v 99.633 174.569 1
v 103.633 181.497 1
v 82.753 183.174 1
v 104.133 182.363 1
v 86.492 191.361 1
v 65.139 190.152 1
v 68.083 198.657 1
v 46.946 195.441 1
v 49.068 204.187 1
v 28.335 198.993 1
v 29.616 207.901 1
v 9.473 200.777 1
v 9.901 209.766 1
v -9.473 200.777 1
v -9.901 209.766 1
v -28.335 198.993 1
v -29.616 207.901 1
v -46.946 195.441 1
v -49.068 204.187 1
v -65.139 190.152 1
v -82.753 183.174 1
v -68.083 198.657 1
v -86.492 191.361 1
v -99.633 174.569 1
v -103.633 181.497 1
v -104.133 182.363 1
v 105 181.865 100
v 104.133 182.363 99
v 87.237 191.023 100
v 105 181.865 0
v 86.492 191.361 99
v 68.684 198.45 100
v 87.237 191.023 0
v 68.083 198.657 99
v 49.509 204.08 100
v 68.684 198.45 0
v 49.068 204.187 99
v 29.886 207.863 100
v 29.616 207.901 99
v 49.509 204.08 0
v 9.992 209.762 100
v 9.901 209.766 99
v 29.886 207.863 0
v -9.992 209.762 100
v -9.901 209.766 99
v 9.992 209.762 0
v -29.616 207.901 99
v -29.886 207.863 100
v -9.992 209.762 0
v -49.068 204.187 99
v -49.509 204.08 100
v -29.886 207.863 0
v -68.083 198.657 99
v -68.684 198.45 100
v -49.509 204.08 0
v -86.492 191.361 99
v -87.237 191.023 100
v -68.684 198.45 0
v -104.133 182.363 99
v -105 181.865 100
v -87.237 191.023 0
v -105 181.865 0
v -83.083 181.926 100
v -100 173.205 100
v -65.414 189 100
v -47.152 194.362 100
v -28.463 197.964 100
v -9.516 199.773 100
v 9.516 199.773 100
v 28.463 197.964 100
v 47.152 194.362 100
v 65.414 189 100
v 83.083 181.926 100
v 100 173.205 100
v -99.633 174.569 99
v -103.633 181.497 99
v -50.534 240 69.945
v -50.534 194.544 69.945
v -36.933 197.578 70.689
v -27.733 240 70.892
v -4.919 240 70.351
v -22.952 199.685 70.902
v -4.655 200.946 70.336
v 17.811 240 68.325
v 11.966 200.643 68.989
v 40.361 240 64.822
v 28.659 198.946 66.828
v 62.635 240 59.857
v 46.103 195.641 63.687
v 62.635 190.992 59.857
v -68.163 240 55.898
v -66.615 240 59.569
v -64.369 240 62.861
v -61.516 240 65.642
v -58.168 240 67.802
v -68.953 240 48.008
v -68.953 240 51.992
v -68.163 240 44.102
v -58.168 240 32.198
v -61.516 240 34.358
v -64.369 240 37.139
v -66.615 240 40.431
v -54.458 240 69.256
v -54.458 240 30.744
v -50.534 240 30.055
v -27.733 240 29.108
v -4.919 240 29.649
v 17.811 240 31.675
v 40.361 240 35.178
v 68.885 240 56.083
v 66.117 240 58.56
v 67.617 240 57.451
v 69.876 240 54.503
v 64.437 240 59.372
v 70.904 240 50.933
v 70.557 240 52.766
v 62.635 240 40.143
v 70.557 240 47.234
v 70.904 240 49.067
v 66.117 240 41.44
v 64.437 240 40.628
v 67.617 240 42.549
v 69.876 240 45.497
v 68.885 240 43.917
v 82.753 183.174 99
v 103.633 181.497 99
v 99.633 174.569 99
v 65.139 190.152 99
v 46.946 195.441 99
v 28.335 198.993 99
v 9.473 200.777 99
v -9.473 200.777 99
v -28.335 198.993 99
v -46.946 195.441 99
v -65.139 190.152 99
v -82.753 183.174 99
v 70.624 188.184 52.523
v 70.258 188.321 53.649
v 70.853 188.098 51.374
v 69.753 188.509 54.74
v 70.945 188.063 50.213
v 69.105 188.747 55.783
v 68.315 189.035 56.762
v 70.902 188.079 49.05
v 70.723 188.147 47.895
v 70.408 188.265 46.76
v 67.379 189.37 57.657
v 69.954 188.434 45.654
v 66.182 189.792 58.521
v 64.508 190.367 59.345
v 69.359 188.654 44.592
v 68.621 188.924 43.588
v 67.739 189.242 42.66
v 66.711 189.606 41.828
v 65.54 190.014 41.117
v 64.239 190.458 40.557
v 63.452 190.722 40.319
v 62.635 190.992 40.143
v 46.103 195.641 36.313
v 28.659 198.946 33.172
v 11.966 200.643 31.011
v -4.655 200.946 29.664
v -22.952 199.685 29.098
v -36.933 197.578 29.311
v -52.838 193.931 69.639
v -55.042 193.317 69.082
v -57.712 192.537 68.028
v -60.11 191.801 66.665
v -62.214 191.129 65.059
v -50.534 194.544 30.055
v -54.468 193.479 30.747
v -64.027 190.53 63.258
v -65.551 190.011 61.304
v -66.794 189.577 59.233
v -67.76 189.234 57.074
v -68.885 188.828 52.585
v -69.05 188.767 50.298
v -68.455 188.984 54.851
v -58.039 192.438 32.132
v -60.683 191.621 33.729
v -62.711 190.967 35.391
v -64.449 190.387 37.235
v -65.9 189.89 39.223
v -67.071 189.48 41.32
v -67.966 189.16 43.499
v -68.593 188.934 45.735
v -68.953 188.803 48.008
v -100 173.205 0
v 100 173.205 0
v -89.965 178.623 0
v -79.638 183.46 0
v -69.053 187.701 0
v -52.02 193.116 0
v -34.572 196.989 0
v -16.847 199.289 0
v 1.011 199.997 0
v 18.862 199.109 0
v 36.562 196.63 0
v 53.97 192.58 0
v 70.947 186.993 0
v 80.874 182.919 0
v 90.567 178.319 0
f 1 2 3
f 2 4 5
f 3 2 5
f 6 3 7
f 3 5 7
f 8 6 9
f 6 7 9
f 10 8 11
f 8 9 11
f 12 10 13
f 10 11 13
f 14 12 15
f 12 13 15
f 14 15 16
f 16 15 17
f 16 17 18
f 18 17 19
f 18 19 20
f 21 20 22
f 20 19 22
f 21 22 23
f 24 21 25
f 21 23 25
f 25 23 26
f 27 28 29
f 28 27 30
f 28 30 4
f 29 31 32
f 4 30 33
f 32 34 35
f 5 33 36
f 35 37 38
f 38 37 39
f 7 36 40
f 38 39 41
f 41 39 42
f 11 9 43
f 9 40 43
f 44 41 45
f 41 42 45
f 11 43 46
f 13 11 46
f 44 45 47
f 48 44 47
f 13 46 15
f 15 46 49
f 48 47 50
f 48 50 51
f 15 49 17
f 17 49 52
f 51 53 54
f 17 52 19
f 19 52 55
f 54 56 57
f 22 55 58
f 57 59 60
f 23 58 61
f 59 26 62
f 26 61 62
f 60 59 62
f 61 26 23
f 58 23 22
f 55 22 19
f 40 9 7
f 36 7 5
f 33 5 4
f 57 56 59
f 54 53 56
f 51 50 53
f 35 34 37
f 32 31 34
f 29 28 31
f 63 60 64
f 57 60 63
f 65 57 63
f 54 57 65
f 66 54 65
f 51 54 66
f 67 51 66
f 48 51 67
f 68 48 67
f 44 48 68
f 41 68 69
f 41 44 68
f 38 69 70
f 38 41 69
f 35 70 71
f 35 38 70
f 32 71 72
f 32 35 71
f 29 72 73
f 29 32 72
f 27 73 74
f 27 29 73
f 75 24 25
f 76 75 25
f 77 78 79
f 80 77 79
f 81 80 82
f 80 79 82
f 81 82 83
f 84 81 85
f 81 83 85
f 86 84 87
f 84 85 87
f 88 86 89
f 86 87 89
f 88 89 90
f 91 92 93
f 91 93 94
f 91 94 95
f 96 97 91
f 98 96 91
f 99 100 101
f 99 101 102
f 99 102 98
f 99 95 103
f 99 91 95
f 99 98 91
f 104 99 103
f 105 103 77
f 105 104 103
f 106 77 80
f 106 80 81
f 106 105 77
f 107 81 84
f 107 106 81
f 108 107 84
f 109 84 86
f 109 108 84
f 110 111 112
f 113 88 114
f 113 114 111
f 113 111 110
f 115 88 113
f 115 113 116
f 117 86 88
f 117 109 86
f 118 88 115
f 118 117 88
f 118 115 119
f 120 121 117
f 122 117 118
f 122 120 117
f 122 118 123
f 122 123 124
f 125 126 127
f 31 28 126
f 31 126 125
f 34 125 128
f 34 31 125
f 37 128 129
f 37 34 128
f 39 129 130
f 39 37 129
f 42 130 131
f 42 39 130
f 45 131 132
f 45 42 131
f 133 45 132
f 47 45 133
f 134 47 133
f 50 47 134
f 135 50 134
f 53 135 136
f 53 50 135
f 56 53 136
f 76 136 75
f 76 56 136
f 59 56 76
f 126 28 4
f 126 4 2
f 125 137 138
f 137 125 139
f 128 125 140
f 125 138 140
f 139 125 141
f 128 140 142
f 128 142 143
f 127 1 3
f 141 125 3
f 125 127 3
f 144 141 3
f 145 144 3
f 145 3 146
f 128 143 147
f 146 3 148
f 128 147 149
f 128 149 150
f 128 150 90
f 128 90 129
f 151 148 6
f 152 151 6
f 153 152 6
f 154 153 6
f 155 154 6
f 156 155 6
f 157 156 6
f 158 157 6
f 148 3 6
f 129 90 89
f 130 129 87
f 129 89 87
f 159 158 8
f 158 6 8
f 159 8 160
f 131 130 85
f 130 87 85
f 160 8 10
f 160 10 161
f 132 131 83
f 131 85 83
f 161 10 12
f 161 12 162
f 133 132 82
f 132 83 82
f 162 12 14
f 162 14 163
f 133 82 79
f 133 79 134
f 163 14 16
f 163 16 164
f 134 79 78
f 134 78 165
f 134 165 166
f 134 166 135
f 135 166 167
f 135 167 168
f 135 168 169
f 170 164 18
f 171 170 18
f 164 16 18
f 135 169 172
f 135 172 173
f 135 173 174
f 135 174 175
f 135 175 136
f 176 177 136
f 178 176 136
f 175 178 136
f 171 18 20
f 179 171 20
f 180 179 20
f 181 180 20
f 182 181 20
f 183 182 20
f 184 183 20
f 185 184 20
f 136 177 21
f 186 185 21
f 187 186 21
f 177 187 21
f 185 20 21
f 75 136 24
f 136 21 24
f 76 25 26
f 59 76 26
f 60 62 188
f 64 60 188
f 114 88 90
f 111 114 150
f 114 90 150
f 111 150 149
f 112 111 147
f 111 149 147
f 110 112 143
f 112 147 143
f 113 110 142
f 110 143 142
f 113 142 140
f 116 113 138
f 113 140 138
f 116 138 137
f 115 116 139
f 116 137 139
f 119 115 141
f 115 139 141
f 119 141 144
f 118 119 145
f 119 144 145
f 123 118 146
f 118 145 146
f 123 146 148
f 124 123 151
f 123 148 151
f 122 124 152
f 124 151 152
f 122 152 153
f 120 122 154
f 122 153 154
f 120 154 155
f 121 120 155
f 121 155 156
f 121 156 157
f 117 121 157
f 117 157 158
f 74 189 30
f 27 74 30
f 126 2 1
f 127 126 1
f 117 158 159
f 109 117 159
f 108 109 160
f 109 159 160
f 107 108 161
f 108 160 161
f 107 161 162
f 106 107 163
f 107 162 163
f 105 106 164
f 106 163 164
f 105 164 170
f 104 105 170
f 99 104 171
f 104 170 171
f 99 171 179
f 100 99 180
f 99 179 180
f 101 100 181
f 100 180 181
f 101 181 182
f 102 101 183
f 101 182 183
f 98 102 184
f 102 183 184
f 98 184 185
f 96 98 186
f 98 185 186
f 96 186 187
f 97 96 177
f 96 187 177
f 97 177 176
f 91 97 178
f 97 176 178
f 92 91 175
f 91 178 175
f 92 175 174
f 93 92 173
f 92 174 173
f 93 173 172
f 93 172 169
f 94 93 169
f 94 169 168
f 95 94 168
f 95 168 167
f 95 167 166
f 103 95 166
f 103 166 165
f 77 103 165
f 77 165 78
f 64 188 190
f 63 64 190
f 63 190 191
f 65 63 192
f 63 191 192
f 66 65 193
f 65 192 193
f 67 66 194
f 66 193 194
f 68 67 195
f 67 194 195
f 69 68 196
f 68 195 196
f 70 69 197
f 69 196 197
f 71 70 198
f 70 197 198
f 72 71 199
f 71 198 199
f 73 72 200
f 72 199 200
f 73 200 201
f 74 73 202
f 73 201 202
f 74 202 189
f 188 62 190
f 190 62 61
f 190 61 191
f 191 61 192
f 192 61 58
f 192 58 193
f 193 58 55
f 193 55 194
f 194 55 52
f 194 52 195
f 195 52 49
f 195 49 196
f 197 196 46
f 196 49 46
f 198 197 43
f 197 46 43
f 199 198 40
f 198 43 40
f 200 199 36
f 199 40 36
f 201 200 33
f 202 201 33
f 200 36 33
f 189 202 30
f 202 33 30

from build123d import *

# Parameters (mm, degrees)
BOSS_EXTRUDE1_DEPTH = 100
CUT_EXTRUDE1_DEPTH  = 98
BOSS_EXTRUDE2_DEPTH = 240
CUT_EXTRUDE2_DEPTH  = 305


with BuildPart() as part:
    # Sketch1 → Boss-Extrude1 (new body)
    with BuildSketch(Plane.XY):
        with BuildLine():
            Line((-105, 181.865334795), (-100, 173.205080757))
            ThreePointArc((-100, 173.205080757), (0, 200), (100, 173.205080757))
            Line((100, 173.205080757), (105, 181.865334795))
            ThreePointArc((105, 181.865334795), (0, 210), (-105, 181.865334795))
        make_face()
    extrude(amount=BOSS_EXTRUDE1_DEPTH)

    # Sketch2 → Cut-Extrude1 (cut)
    with BuildSketch(Plane(origin=(0, 0, 1), x_dir=(-1, 0, 0), z_dir=(0, 0, -1))):
        with BuildLine():
            Line((99.632730807, 174.568951855), (103.632778417, 181.497237548))
            ThreePointArc((103.632778417, 181.497237548), (0, 209), (-103.632778417, 181.497237548))
            Line((-103.632778417, 181.497237548), (-99.632730807, 174.568951855))
            ThreePointArc((-99.632730807, 174.568951855), (0, 201), (99.632730807, 174.568951855))
        make_face()
        with BuildLine():
            Line((-104.132784113, 182.363272818), (-103.632778417, 181.497237548))
            ThreePointArc((-103.632778417, 181.497237548), (0, 209), (103.632778417, 181.497237548))
            Line((103.632778417, 181.497237548), (104.132784113, 182.363272818))
            ThreePointArc((104.132784113, 182.363272818), (0, 210), (-104.132784113, 182.363272818))
        make_face()
        with BuildLine():
            Line((-105.359240795, 184.487558104), (-104.132784113, 182.363272818))
            ThreePointArc((-104.132784113, 182.363272818), (0, 210), (104.132784113, 182.363272818))
            Line((104.132784113, 182.363272818), (105.359240795, 184.487558104))
            ThreePointArc((105.359240795, 184.487558104), (0, 213.475505009), (-105.359240795, 184.487558104))
        make_face()
    extrude(amount=-CUT_EXTRUDE1_DEPTH, mode=Mode.SUBTRACT)

    # Sketch3 → Boss-Extrude2 (add)
    with BuildSketch(Plane(origin=(0, 0, 0), x_dir=(1, 0, 0), z_dir=(0, 1, 0))):
        with BuildLine():
            ThreePointArc((-50.533623167, -30.054914333), (-69.052556755, -50), (-50.533623167, -69.945085667))
            ThreePointArc((-50.533623167, -69.945085667), (6.462857127, -69.523597841), (62.635134299, -59.856556138))
            ThreePointArc((62.635134299, -59.856556138), (70.947443245, -50), (62.635134299, -40.143443862))
            ThreePointArc((62.635134299, -40.143443862), (6.462857127, -30.476402159), (-50.533623167, -30.054914333))
        make_face()
    extrude(amount=BOSS_EXTRUDE2_DEPTH)

    # Sketch4 → Cut-Extrude2 (cut)
    with BuildSketch(Plane.XY):
        with BuildLine():
            Line((-69.052556755, 187.701210453), (-109.027774, 39.169052656))
            Line((-109.027774, 39.169052656), (-56.106611476, -33.467837082))
            Line((-56.106611476, -33.467837082), (100.062701462, -27.760652889))
            Line((100.062701462, -27.760652889), (70.947443245, 186.993209227))
            ThreePointArc((70.947443245, 186.993209227), (1.01141739, 199.997442571), (-69.052556755, 187.701210453))
        make_face()
    extrude(amount=CUT_EXTRUDE2_DEPTH, mode=Mode.SUBTRACT)


solid = part.part
